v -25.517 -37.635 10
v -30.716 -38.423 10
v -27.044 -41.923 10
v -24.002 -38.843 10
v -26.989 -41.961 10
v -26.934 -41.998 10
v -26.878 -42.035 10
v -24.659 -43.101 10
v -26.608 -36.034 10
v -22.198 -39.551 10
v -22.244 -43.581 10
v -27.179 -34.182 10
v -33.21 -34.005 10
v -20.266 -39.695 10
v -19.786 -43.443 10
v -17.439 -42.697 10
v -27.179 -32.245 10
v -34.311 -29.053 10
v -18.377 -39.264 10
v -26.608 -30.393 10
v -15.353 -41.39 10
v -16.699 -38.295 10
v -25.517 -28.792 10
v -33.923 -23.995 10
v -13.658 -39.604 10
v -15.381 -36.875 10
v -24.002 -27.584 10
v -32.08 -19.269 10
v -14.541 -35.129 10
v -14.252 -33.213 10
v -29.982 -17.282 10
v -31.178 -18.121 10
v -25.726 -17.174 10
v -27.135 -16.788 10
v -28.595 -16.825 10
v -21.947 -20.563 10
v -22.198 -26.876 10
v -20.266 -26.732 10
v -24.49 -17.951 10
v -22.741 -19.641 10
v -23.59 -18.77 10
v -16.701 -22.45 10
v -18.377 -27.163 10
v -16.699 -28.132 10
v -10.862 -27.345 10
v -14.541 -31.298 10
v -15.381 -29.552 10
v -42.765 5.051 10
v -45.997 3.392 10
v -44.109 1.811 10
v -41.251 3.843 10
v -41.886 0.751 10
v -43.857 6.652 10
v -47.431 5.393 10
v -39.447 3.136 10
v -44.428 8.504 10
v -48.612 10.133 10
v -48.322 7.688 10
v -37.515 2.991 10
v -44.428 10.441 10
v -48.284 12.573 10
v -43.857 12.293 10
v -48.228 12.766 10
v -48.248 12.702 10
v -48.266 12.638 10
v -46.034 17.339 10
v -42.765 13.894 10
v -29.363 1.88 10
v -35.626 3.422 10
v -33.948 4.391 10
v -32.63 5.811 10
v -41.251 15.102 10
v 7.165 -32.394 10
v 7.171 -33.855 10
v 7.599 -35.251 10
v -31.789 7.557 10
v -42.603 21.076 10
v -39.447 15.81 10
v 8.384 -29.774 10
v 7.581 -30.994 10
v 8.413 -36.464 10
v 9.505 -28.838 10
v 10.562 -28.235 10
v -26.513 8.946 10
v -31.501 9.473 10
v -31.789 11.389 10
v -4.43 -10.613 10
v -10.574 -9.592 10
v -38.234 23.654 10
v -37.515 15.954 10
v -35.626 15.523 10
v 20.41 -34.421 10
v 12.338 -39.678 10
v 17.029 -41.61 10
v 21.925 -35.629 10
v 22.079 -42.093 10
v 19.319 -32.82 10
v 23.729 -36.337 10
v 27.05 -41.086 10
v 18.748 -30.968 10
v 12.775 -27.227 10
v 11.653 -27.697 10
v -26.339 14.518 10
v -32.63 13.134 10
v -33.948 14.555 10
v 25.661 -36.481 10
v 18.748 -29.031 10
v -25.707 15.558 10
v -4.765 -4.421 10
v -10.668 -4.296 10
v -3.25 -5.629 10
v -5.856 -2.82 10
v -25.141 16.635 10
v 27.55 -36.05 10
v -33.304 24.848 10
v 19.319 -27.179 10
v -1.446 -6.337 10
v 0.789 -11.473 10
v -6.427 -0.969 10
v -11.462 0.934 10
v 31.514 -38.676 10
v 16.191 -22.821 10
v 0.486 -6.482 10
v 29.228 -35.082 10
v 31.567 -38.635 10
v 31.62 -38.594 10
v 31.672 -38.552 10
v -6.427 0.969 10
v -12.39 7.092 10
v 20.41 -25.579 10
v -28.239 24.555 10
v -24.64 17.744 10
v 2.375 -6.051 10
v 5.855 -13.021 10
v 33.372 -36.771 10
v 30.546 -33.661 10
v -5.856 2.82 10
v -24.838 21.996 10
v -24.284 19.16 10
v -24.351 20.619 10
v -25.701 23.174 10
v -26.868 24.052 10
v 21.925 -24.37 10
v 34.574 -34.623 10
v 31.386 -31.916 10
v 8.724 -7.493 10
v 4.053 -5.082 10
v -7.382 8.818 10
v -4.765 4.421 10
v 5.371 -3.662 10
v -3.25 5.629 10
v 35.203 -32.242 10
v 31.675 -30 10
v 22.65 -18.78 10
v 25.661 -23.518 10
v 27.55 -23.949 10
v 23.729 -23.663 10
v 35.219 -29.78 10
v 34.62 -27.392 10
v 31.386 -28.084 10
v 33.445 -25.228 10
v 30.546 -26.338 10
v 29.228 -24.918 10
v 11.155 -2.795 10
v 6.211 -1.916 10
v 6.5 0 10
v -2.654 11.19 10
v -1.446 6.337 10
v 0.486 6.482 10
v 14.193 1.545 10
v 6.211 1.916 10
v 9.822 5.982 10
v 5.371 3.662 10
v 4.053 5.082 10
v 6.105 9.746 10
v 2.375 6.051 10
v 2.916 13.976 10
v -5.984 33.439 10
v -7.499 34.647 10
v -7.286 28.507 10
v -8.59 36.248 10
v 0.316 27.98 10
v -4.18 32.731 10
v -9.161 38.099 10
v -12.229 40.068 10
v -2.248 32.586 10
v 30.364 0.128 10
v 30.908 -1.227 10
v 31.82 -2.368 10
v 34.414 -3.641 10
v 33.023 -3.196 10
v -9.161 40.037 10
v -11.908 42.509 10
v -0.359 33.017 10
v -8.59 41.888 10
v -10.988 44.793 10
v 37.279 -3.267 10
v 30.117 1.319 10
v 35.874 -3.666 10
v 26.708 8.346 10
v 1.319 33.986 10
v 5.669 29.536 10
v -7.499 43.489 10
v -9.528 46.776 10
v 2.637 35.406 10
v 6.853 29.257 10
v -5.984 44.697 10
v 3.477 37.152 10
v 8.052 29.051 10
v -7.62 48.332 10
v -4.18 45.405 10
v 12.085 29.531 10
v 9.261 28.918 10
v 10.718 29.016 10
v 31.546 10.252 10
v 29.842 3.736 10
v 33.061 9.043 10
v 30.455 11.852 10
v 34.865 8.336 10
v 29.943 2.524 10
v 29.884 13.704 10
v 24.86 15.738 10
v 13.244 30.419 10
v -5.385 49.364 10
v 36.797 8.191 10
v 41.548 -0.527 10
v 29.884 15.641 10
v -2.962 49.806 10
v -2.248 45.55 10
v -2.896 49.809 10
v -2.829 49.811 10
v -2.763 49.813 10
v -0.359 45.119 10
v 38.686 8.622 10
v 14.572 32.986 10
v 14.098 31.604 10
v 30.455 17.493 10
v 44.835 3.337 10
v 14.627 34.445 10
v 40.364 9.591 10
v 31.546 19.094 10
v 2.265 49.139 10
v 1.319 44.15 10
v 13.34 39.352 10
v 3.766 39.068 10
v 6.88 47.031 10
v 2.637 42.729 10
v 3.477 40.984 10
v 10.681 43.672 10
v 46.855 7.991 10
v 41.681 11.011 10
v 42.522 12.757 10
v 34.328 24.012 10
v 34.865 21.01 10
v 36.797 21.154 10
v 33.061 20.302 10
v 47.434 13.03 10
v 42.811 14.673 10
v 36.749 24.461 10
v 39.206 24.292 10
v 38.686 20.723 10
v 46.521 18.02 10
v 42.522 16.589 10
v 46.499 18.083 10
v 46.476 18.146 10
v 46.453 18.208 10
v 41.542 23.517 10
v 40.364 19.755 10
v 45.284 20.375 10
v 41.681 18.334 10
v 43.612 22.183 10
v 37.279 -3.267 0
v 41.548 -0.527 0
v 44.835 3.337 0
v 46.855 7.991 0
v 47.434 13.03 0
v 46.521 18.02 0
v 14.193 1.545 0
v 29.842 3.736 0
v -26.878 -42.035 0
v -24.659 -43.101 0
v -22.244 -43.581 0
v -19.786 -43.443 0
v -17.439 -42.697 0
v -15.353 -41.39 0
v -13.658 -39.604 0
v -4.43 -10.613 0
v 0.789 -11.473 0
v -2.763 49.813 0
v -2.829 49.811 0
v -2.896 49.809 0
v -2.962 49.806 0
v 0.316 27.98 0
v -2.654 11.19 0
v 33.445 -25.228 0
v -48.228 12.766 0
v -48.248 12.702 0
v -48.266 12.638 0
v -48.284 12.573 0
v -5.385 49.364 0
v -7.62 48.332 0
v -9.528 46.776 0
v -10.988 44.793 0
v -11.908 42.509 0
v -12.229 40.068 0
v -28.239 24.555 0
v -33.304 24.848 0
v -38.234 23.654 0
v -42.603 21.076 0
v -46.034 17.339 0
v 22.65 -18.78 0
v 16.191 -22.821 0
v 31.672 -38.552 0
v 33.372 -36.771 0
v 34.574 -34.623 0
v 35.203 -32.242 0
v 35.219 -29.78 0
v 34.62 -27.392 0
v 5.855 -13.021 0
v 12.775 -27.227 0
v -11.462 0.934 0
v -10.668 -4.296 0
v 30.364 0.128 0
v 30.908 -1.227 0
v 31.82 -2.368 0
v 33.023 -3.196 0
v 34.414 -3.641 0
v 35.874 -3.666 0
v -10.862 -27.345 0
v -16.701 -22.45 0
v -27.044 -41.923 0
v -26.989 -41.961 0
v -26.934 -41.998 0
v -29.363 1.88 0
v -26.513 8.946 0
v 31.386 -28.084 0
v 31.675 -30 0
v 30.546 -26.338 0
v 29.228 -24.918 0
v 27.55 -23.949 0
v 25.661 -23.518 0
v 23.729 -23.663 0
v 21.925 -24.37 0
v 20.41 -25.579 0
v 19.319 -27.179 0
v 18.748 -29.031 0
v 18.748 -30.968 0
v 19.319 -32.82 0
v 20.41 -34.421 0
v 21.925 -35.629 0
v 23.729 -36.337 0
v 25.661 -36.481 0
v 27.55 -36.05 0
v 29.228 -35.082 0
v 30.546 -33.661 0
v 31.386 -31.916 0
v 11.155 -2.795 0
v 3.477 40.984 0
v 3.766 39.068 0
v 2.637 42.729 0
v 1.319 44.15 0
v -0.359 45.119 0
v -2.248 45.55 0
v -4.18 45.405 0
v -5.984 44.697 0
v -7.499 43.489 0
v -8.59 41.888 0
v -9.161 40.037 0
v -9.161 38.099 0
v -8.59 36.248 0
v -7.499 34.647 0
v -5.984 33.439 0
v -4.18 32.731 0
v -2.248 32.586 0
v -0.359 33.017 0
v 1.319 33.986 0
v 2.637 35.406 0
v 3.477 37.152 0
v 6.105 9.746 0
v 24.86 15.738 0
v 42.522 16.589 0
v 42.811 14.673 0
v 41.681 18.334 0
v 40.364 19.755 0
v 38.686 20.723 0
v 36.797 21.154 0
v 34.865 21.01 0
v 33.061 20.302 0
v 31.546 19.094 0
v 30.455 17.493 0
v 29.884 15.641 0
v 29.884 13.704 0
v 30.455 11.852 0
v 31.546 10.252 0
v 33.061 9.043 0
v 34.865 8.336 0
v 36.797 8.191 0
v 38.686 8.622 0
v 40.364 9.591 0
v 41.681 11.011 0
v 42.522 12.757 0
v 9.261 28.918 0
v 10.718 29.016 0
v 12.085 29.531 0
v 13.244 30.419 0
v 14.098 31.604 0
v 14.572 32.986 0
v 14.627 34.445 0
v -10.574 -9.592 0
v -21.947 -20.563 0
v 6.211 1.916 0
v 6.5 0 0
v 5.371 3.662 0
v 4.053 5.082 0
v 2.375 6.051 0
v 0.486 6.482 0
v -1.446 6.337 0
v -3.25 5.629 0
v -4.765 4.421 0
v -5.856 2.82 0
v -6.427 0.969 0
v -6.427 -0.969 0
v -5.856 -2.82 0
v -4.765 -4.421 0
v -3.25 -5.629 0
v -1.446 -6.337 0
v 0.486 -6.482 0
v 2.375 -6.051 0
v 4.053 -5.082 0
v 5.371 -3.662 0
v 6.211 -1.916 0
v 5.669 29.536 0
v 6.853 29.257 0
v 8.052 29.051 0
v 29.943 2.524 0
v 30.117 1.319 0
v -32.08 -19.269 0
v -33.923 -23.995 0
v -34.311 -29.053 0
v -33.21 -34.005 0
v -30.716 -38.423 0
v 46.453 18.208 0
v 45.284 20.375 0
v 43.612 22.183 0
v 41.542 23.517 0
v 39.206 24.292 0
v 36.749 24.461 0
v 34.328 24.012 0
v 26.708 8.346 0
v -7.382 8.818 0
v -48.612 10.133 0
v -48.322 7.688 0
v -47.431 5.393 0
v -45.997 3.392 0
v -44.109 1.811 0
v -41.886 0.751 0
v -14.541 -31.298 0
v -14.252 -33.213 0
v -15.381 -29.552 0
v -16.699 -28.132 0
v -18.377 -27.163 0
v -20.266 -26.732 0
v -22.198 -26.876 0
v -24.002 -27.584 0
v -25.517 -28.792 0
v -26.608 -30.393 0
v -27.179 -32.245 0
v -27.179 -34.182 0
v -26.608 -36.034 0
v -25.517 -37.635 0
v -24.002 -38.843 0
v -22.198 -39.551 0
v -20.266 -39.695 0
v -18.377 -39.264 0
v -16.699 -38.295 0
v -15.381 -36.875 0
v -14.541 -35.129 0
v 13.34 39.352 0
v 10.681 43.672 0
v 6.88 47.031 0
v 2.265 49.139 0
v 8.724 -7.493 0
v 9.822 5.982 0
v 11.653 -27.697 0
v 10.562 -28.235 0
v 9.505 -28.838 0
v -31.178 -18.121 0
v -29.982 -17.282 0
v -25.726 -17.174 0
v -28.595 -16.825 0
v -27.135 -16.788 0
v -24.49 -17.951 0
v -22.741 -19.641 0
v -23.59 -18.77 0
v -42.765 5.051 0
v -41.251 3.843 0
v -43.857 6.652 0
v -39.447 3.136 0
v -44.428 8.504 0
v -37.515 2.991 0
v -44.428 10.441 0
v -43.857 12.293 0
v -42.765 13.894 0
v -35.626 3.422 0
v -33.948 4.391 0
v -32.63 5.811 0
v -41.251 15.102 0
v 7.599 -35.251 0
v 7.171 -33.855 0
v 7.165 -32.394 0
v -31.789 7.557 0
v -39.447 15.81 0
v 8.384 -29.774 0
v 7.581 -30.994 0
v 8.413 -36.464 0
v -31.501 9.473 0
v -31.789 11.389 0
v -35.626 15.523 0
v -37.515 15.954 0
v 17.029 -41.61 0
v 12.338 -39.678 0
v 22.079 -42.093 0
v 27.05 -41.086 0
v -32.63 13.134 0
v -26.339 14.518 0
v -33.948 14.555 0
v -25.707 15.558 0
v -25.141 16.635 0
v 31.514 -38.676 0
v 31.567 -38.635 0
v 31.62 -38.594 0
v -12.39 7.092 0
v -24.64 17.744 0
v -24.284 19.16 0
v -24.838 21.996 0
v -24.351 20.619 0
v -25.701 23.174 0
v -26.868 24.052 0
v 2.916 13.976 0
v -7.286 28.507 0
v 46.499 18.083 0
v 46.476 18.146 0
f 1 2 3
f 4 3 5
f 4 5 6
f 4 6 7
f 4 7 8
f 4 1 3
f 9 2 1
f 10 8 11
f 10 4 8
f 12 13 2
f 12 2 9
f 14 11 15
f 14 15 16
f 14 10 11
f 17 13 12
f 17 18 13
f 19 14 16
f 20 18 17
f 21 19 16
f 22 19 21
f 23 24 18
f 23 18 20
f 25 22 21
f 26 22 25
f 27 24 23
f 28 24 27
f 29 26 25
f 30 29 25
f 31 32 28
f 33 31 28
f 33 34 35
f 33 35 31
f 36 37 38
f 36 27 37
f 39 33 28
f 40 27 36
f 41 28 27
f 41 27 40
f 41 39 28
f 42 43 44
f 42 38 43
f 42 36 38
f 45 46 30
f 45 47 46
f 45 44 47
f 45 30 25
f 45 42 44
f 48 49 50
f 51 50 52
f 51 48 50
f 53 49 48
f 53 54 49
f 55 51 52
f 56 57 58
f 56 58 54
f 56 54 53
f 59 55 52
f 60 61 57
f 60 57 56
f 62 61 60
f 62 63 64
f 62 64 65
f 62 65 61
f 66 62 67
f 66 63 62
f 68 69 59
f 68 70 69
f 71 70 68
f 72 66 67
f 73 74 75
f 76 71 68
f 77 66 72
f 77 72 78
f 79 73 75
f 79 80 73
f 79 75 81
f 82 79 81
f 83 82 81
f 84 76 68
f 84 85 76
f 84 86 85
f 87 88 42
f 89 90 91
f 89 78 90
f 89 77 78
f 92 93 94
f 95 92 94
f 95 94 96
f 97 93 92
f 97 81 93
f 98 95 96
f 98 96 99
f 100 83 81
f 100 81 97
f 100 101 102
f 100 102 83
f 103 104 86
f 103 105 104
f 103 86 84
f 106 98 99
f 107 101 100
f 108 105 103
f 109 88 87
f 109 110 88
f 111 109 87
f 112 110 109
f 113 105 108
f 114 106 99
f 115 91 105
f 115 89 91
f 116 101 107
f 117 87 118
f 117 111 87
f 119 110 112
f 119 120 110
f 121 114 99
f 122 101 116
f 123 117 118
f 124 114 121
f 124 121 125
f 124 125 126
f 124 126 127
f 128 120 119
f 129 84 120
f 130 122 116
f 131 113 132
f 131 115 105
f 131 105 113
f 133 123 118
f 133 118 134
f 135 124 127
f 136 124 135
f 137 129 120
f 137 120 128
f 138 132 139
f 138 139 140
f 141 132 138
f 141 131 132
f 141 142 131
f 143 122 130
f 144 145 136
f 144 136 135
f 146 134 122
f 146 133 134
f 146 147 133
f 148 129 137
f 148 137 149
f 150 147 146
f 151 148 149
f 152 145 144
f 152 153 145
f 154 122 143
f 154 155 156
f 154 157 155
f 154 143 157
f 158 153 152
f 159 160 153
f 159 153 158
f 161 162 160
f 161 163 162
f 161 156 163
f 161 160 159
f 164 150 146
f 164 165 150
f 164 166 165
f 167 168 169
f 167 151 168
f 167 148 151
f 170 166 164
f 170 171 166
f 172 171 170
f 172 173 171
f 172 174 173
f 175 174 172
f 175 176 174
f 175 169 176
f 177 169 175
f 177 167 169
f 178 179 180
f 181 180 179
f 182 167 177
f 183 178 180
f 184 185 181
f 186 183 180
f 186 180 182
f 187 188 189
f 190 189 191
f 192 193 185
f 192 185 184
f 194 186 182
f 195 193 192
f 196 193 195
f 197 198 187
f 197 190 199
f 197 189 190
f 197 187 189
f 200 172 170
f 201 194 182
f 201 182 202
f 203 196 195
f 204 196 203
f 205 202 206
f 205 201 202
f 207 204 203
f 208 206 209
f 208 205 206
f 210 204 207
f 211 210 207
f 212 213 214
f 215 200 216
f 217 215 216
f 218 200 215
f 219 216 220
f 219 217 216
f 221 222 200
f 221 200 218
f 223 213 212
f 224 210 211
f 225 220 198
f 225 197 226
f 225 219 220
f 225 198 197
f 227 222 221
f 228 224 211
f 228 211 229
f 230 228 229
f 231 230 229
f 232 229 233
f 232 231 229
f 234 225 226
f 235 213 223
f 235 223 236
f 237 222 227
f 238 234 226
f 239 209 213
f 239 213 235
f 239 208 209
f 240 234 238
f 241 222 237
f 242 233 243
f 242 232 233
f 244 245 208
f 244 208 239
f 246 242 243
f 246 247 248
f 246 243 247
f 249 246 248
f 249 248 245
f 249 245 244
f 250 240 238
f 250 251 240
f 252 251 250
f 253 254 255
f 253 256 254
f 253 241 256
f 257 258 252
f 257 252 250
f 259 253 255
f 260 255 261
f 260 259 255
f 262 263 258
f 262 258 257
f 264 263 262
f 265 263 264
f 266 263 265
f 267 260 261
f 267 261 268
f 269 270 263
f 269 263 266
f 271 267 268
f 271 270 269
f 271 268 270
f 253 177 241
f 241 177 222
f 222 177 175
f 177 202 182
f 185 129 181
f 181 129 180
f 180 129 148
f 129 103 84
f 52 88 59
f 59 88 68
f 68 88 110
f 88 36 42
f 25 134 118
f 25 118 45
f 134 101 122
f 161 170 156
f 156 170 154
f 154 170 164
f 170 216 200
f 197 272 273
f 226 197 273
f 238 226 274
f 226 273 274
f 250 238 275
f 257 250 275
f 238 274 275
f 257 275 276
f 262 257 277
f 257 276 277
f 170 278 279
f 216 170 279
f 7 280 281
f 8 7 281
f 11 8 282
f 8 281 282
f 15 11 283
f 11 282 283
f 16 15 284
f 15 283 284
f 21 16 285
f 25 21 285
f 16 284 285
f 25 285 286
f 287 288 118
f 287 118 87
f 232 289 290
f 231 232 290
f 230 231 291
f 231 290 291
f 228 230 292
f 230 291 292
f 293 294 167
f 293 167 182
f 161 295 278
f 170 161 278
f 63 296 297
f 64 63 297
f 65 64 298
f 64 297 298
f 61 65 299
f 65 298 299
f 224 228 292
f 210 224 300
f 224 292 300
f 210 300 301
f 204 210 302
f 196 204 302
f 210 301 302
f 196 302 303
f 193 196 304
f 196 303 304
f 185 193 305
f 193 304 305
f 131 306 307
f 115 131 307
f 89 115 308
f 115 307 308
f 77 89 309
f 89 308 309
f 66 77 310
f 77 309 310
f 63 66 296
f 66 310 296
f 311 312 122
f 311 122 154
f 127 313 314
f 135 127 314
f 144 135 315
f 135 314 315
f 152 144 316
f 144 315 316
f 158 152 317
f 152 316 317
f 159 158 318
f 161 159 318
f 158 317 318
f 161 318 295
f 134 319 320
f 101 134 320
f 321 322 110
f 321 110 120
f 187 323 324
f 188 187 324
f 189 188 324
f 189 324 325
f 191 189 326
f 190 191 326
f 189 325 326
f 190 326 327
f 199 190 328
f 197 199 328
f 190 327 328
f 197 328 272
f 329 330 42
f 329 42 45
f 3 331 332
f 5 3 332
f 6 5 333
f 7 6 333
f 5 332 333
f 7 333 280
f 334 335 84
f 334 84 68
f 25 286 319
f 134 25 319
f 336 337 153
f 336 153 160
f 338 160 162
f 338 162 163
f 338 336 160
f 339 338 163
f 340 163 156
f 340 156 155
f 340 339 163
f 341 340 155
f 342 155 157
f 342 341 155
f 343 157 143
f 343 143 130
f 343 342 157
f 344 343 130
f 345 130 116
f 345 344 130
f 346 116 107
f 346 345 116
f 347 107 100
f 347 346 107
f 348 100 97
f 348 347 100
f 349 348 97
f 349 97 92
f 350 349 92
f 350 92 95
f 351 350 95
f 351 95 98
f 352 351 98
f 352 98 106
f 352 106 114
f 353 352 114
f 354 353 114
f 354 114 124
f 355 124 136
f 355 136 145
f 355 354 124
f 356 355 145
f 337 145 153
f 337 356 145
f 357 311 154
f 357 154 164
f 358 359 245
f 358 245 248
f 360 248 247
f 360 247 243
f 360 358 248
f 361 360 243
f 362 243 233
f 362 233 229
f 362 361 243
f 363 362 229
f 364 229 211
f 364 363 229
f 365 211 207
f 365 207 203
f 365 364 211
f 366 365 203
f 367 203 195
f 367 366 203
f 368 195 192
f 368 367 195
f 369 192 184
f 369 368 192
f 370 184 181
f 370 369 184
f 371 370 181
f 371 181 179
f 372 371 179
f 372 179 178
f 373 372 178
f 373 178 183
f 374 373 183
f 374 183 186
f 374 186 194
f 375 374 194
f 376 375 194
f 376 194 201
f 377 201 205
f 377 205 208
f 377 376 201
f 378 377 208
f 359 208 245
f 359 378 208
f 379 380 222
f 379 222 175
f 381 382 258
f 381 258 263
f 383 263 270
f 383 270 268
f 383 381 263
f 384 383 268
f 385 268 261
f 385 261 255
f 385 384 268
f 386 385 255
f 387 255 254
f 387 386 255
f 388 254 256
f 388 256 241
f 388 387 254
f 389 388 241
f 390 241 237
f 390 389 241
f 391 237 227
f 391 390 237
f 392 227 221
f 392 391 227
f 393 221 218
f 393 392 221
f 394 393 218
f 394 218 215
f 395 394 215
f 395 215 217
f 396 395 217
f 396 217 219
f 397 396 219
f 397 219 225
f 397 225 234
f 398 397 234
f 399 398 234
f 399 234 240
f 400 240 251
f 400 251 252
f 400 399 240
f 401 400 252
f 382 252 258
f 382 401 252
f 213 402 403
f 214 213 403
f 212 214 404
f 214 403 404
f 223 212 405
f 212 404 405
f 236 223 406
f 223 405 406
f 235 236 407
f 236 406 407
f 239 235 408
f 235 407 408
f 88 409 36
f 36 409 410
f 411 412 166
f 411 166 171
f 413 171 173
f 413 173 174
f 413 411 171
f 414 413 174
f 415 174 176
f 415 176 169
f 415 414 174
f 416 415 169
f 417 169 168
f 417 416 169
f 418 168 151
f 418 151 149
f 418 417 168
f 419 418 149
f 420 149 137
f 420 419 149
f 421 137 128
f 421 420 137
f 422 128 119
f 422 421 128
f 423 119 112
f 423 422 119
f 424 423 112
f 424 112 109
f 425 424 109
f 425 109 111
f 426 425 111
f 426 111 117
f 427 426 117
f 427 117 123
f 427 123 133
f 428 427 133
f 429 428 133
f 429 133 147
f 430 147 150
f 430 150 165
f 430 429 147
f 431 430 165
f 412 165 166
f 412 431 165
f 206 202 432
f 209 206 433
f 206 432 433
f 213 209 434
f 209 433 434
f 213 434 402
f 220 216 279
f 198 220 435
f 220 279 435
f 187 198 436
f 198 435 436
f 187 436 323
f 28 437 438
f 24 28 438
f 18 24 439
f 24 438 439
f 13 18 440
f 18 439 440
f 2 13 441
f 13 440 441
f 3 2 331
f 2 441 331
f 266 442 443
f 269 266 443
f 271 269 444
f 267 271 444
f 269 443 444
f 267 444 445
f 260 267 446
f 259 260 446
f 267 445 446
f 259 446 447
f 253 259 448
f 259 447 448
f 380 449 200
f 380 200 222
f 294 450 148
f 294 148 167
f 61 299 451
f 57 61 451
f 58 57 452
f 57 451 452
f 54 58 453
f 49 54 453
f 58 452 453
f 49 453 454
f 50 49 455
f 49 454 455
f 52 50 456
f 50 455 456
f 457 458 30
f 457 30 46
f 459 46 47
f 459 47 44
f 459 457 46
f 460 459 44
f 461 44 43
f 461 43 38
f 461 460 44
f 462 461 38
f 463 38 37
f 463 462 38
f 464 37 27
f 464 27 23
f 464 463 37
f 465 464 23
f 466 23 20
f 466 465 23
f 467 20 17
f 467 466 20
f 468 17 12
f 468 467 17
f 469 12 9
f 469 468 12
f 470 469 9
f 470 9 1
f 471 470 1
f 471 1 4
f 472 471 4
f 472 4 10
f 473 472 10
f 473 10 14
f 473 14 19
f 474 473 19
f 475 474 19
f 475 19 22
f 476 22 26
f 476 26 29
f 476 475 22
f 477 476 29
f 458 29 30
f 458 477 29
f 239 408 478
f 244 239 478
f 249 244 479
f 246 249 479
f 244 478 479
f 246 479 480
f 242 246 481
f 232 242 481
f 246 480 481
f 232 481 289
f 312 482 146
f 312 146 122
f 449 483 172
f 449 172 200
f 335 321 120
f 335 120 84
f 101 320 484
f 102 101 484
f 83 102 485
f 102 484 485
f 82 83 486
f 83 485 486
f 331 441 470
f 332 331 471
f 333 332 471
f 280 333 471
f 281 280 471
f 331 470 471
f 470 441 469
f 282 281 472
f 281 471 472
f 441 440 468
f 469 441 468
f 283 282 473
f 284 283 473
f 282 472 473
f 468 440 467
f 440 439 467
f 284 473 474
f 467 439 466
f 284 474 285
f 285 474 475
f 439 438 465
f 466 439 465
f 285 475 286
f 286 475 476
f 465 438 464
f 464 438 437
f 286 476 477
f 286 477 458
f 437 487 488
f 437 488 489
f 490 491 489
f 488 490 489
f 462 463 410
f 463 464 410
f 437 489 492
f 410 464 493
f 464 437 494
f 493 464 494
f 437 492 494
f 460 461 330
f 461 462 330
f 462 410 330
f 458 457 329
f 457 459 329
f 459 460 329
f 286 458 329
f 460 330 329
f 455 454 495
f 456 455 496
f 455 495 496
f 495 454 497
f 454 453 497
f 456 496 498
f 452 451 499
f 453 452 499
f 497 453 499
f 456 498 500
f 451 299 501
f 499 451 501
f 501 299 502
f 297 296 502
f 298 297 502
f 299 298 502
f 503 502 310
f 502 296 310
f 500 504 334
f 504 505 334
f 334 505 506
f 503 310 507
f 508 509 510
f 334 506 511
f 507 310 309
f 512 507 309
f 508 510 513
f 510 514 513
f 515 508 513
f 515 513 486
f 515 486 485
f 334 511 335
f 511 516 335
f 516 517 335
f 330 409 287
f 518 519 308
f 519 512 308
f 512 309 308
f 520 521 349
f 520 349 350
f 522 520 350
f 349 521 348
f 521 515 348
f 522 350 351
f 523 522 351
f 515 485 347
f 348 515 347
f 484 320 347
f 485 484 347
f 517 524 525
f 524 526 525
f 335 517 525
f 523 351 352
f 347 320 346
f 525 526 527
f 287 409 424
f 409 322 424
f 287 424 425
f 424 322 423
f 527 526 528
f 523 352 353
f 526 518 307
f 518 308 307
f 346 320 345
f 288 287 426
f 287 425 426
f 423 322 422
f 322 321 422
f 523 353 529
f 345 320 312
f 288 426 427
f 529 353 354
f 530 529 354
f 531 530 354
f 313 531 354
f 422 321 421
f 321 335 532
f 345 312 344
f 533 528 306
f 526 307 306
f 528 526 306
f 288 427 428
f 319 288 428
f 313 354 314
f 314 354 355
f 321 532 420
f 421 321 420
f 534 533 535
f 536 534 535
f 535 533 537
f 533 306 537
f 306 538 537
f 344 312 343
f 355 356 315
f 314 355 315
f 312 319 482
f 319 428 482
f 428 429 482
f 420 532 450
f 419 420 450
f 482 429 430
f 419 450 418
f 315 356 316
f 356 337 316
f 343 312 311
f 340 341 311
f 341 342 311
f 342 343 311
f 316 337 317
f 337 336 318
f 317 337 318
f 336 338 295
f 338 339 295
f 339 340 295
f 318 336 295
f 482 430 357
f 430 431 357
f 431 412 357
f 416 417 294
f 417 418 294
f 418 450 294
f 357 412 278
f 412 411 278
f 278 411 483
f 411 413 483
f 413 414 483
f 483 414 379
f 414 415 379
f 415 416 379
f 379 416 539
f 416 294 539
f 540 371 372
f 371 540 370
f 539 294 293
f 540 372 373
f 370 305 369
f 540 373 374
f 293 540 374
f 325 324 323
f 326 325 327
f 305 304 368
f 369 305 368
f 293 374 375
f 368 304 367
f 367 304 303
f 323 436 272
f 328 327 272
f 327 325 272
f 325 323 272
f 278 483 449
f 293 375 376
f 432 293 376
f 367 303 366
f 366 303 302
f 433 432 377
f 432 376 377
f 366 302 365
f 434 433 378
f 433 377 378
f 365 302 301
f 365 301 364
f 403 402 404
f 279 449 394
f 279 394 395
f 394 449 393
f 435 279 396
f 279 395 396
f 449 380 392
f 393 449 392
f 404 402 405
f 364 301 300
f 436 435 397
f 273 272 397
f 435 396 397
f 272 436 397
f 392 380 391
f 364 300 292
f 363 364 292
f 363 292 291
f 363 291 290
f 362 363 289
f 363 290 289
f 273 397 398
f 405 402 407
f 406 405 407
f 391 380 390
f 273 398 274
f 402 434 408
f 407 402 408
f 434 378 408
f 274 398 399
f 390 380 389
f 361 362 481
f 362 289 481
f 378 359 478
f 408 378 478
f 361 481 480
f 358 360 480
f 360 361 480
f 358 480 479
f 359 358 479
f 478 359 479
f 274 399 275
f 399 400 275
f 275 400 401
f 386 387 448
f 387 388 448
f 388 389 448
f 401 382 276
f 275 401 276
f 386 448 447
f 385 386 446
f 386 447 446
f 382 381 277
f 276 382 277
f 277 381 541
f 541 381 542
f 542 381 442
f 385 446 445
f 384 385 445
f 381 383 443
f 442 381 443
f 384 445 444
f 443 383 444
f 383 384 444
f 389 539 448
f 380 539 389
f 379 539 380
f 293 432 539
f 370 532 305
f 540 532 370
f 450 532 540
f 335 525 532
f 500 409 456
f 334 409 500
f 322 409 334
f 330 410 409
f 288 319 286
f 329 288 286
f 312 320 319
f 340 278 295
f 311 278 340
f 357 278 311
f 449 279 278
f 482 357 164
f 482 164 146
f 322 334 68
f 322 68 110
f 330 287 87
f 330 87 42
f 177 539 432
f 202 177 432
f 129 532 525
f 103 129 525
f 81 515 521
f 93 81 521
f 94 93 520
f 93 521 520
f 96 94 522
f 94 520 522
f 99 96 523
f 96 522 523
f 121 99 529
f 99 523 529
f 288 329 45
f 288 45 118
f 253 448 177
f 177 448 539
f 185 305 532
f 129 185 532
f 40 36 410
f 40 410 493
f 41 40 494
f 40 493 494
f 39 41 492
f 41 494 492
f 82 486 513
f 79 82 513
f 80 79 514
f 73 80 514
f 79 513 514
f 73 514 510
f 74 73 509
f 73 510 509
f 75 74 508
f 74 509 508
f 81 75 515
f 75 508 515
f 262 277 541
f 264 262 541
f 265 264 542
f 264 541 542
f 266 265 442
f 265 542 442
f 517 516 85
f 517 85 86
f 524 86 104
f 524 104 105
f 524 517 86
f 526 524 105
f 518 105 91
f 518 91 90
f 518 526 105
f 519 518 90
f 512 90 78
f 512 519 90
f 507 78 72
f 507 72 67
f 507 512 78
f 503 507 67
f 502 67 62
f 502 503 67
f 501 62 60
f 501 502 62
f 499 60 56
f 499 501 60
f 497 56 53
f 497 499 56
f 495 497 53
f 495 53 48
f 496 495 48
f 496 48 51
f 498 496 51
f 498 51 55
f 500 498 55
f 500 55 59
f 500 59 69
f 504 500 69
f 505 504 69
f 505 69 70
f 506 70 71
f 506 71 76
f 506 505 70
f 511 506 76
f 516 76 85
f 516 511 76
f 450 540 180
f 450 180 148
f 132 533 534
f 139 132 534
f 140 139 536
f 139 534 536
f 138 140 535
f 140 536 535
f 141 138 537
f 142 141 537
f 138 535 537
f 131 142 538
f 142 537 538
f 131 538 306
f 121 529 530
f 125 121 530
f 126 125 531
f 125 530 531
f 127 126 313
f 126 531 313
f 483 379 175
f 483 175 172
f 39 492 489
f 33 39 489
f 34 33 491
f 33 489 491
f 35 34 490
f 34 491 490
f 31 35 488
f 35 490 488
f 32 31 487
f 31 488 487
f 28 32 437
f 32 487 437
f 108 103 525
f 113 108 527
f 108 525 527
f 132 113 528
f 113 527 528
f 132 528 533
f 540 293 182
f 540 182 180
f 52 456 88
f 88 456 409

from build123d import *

# Parameters (mm, degrees)
F0_R     = 12.5
F2_DEPTH = 10
F3_R     = 6.5
F4_DEPTH = 10
F1_R     = 6.5
F5_DEPTH = 10
F7_DEPTH = 10


with BuildPart() as f2:
    # F0 (on Top) → F2 (new body)
    with BuildSketch(Plane.XY):
        Circle(F0_R)
    extrude(amount=F2_DEPTH)

    # F3 (on Top) → F4 (join)
    with BuildSketch(Plane.XY):
        with BuildLine():
            Line((34.328218, 24.012301), (2.916428, 13.975679))
            Line((2.916428, 13.975679), (5.668561, 29.53591))
            ThreePointArc((5.668561, 29.53591), (7.450694, 29.144745), (9.261052, 28.917566))
            ThreePointArc((9.261052, 28.917566), (13.244302, 30.419157), (14.627135, 34.445176))
            ThreePointArc((14.627135, 34.445176), (8.904501, 45.49223), (-2.762528, 49.812691))
            ThreePointArc((-2.762528, 49.812691), (-2.862519, 49.810248), (-2.962442, 49.805804))
            ThreePointArc((-2.962442, 49.805804), (-9.528349, 46.776185), (-12.229052, 40.068284))
            Line((-12.229052, 40.068284), (-12.390435, 7.09241))
            Line((-12.390435, 7.09241), (-26.338638, 14.51822))
            ThreePointArc((-26.338638, 14.51822), (-25.415909, 16.092253), (-24.640417, 17.743804))
            ThreePointArc((-24.640417, 17.743804), (-24.837623, 21.996117), (-28.239276, 24.555377))
            ThreePointArc((-28.239276, 24.555377), (-40.51404, 22.526556), (-48.228353, 12.765648))
            ThreePointArc((-48.228353, 12.765648), (-48.256928, 12.669795), (-48.283579, 12.57339))
            ThreePointArc((-48.283579, 12.57339), (-47.431217, 5.392638), (-41.886188, 0.751261))
            Line((-41.886188, 0.751261), (-10.574138, -9.592329))
            Line((-10.574138, -9.592329), (-21.946735, -20.563157))
            ThreePointArc((-21.946735, -20.563157), (-23.158589, -19.199186), (-24.489668, -17.951293))
            ThreePointArc((-24.489668, -17.951293), (-28.594798, -16.824809), (-32.079968, -19.269118))
            ThreePointArc((-32.079968, -19.269118), (-33.943555, -31.570053), (-27.044233, -41.923087))
            ThreePointArc((-27.044233, -41.923087), (-26.961902, -41.979883), (-26.878451, -42.035021))
            ThreePointArc((-26.878451, -42.035021), (-19.785755, -43.443351), (-13.658035, -39.60398))
            Line((-13.658035, -39.60398), (5.855259, -13.020795))
            Line((5.855259, -13.020795), (12.77481, -27.22695))
            ThreePointArc((12.77481, -27.22695), (11.103113, -27.958002), (9.50497, -28.838313))
            ThreePointArc((9.50497, -28.838313), (7.165066, -32.394421), (8.412765, -36.464347))
            ThreePointArc((8.412765, -36.464347), (19.535769, -42.037922), (31.514097, -38.675541))
            ThreePointArc((31.514097, -38.675541), (31.593556, -38.61479), (31.671783, -38.552462))
            ThreePointArc((31.671783, -38.552462), (35.202948, -32.242106), (33.445058, -25.227866))
            Line((33.445058, -25.227866), (14.192887, 1.545035))
            Line((14.192887, 1.545035), (29.842002, 3.735976))
            ThreePointArc((29.842002, 3.735976), (30.020691, 1.920191), (30.364063, 0.128235))
            ThreePointArc((30.364063, 0.128235), (33.023052, -3.196044), (37.279343, -3.267088))
            ThreePointArc((37.279343, -3.267088), (46.017324, 5.589188), (46.521017, 18.020288))
            ThreePointArc((46.521017, 18.020288), (46.487793, 18.114631), (46.45269, 18.208289))
            ThreePointArc((46.45269, 18.208289), (41.542374, 23.516634), (34.328218, 24.012301))
        make_face()
        with Locations((-20.751796, -33.213474)):
            Circle(F3_R, mode=Mode.SUBTRACT)
        with Locations((25.175233, -29.999658)):
            Circle(F3_R, mode=Mode.SUBTRACT)
        with Locations((-38.000548, 9.472603)):
            Circle(F3_R, mode=Mode.SUBTRACT)
        with Locations((-2.733835, 39.067864)):
            Circle(F3_R, mode=Mode.SUBTRACT)
        with Locations((36.310946, 14.672665)):
            Circle(F3_R, mode=Mode.SUBTRACT)
    extrude(amount=F4_DEPTH)

    # F1 (on Top) → F5 (cut)
    with BuildSketch(Plane.XY):
        Circle(F1_R)
    extrude(amount=F5_DEPTH, mode=Mode.SUBTRACT)

    # F6 (on Top) → F7 (cut)
    with BuildSketch(Plane.XY):
        Polygon((0.315685, 27.979563), (-7.285573, 28.507008), (-7.38193, 8.817999), (-2.653955, 11.189572), align=None)
        Polygon((-26.512594, 8.946395), (-29.363142, 1.880158), (-10.667557, -4.295721), (-11.462033, 0.933707), align=None)
        Polygon((-16.701369, -22.450387), (-10.861847, -27.345007), (0.789017, -11.472901), (-4.429971, -10.61251), align=None)
        Polygon((16.19058, -22.821497), (22.650152, -18.780302), (11.155197, -2.794921), (8.72416, -7.492598), align=None)
        Polygon((26.707698, 8.345926), (24.86041, 15.738142), (6.105273, 9.745544), (9.821798, 5.981829), align=None)
    extrude(amount=F7_DEPTH, mode=Mode.SUBTRACT)


solid = f2.part
